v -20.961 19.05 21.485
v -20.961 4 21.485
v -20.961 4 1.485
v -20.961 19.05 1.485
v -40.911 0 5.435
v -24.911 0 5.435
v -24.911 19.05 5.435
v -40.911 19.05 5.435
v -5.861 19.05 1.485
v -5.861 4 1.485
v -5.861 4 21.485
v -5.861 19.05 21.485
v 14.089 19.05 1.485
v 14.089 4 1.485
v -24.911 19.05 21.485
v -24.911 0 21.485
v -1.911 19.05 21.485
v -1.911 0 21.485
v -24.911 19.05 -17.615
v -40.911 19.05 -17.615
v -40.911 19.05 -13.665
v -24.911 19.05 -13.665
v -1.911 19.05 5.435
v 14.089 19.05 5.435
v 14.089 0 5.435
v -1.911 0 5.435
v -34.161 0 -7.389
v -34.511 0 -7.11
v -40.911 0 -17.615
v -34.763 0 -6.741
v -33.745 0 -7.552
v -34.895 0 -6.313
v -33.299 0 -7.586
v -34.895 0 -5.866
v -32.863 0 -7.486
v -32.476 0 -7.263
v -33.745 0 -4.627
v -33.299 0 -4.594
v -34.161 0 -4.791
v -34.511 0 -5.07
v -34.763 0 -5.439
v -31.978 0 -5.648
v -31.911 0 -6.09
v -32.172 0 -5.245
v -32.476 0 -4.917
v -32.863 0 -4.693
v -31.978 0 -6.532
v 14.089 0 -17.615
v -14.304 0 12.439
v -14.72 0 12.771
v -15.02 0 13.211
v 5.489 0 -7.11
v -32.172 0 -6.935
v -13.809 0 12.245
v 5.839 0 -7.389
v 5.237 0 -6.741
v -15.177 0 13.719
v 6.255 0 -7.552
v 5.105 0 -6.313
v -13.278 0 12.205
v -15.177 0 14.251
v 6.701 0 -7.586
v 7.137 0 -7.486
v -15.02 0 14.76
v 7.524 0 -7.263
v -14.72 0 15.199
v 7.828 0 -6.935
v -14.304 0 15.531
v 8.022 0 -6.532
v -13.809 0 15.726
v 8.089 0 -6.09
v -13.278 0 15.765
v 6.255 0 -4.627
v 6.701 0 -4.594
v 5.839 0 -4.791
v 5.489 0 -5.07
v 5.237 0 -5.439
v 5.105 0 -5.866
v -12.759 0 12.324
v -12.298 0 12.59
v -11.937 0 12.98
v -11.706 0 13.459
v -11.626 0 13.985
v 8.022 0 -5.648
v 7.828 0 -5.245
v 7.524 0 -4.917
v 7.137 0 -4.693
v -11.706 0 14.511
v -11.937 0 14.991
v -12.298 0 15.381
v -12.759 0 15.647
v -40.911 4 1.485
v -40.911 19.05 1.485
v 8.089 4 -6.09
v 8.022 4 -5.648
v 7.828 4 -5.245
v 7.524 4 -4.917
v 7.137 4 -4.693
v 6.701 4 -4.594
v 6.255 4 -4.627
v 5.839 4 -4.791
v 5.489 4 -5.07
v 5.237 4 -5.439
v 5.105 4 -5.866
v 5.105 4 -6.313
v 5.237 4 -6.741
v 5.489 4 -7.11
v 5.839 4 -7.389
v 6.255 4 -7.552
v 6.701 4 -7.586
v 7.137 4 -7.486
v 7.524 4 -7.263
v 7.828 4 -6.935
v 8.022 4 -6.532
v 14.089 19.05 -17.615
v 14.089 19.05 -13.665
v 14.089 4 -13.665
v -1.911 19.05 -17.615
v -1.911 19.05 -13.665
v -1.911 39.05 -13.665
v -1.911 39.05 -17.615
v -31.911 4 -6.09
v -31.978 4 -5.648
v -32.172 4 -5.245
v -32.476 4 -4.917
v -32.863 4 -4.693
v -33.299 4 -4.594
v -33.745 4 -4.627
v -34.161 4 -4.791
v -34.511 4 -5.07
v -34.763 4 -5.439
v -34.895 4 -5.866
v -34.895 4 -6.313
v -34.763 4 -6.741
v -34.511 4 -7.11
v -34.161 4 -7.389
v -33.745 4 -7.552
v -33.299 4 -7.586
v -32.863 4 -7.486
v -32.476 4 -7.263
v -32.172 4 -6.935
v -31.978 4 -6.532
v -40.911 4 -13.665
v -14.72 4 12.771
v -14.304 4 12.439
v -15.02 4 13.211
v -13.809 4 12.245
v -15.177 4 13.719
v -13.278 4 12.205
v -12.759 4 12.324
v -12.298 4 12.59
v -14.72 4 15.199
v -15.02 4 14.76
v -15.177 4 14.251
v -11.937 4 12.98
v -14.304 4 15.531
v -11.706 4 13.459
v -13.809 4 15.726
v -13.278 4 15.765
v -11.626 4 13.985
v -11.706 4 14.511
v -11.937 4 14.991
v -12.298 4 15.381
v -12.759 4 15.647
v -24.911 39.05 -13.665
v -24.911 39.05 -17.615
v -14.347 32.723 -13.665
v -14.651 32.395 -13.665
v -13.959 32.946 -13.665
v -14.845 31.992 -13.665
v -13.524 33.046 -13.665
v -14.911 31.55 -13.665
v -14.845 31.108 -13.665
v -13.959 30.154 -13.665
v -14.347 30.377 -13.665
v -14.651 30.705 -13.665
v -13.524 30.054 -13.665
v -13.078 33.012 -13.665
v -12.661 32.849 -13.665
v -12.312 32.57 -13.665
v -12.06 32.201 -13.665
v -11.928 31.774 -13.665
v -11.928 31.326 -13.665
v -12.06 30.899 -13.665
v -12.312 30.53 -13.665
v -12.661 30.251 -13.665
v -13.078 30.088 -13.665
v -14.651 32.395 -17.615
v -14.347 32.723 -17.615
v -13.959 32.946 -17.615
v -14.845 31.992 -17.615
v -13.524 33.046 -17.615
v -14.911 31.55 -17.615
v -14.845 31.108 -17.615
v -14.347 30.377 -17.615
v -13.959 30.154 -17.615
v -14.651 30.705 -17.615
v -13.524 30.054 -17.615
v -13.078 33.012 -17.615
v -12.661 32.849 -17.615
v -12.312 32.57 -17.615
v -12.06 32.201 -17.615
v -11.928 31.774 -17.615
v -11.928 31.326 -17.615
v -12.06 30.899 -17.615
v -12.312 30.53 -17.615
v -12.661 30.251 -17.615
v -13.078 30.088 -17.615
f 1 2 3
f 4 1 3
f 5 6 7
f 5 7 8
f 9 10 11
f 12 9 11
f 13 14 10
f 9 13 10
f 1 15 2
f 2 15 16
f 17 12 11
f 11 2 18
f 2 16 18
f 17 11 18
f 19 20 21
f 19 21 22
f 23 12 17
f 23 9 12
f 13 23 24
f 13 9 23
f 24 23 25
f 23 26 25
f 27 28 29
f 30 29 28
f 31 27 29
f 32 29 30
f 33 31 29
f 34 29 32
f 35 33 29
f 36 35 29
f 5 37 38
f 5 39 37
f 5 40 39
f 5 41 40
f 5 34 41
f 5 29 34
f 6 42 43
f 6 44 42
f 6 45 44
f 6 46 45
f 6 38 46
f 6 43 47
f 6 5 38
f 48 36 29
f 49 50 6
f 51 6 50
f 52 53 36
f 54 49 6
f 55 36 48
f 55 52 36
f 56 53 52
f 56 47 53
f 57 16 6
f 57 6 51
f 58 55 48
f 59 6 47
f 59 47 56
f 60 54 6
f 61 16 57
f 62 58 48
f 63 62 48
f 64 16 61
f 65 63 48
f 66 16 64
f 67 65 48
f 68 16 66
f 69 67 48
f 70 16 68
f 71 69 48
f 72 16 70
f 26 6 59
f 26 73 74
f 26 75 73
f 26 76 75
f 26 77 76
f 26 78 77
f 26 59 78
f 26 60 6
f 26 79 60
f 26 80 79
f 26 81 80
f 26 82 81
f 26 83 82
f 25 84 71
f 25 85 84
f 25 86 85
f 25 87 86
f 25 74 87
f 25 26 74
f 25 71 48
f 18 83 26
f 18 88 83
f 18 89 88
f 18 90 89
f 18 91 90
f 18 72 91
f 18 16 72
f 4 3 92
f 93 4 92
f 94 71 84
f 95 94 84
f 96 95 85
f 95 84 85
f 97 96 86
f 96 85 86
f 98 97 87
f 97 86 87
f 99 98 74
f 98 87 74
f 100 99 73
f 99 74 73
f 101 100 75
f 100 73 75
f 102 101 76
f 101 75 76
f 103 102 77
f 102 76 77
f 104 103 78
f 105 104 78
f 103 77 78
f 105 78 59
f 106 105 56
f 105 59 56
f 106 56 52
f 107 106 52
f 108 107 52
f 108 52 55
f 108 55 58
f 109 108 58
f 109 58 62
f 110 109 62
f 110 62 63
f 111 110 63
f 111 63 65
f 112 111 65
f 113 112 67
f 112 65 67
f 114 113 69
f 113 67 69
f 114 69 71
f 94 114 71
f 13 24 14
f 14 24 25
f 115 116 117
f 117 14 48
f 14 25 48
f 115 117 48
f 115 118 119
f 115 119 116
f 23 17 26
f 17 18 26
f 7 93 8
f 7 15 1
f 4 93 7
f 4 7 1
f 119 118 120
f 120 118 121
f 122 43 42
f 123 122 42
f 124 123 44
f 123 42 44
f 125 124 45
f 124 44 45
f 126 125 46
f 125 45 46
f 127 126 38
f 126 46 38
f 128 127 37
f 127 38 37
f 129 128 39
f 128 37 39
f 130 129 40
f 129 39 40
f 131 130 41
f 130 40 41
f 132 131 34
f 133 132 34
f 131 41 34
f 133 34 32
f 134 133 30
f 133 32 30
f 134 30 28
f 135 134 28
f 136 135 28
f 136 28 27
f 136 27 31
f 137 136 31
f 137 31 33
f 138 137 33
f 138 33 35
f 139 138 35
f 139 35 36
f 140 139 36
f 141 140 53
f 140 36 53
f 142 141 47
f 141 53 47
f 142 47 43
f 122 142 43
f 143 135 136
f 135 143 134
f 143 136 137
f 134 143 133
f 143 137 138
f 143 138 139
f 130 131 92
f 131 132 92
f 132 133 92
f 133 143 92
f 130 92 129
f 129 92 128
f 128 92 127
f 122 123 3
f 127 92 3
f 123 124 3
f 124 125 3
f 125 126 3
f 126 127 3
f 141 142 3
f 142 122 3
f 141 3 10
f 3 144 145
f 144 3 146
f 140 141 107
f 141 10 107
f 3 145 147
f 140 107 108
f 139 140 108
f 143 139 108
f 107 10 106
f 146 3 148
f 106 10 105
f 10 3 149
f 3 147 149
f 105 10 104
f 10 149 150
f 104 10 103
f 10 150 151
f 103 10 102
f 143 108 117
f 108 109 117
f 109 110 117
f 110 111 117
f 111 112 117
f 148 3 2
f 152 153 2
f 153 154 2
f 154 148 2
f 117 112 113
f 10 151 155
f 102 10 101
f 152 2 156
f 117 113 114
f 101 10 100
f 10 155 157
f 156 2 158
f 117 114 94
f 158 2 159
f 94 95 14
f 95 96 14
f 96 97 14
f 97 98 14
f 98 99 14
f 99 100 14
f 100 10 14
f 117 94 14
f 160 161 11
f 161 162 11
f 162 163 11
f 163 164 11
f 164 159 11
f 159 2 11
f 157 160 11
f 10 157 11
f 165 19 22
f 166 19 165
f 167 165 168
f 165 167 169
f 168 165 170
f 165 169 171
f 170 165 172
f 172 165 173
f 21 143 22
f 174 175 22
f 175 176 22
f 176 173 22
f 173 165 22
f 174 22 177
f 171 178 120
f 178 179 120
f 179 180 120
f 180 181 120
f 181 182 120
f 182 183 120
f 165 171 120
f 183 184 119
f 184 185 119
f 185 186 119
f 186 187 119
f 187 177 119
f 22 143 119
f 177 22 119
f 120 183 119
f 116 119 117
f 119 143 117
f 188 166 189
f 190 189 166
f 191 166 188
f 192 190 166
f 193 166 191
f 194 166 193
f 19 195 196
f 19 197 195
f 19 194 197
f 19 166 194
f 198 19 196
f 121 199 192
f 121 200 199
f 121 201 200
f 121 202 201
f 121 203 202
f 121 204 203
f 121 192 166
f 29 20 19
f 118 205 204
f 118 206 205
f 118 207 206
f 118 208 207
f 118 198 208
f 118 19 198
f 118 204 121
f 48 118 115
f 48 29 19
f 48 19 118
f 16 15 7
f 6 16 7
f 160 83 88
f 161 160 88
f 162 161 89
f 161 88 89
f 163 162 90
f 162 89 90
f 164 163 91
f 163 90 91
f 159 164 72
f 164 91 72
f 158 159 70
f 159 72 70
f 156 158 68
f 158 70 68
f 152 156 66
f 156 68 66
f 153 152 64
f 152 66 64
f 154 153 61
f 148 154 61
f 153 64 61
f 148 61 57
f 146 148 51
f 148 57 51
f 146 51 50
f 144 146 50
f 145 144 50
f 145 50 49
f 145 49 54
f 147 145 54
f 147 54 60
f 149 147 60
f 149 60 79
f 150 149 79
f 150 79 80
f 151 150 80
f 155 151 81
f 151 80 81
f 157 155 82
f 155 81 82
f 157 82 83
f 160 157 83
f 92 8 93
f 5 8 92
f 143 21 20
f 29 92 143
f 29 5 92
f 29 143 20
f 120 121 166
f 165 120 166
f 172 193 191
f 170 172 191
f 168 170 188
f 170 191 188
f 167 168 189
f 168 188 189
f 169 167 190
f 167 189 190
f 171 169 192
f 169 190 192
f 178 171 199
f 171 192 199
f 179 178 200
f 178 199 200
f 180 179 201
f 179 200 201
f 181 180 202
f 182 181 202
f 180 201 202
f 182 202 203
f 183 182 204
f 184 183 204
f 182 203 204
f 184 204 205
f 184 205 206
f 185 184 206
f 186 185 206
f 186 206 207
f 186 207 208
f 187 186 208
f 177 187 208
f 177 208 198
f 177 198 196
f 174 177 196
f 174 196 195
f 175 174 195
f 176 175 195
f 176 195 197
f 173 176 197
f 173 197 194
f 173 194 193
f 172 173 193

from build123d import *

# Parameters (mm, degrees)
SKETCH_1_W          = 55
SKETCH_1_H          = 19.1
EXTRUDE_1_DEPTH     = 4
SKETCH_2_W          = 55
SKETCH_2_H          = 3.95
EXTRUDE_2_DEPTH     = 15.05
EXTRUDE_3_DEPTH     = 4
SKETCH_4_W          = 3.95
SKETCH_4_H          = 16.05
SKETCH_4_W_2        = 16
SKETCH_4_H_2        = 3.95
EXTRUDE_4_DEPTH     = 15.05
SKETCH_5_W          = 23
SKETCH_5_H          = 20
EXTRUDE_5_DEPTH     = 3.95
SKETCH_6_R          = 1.5
CUT_EXTRUDE_1_DEPTH = 4
SKETCH_7_R          = 1.5
SKETCH_7_R_2        = 1.78505628
CUT_EXTRUDE_2_DEPTH = 4


with BuildPart() as part:
    # 草图1 → 凸台-拉伸1 (new body)
    with BuildSketch(Plane(origin=(0, 0, 0), x_dir=(1, 0, 0), z_dir=(0, 1, 0))):
        with Locations((-13.411439114, 8.064760148)):
            Rectangle(SKETCH_1_W, SKETCH_1_H)
    extrude(amount=EXTRUDE_1_DEPTH)

    # 草图2 → 凸台-拉伸2 (add)
    with BuildSketch(Plane(origin=(0, 4, 0), x_dir=(1, 0, 0), z_dir=(0, 1, 0))):
        with Locations((-13.411439114, 15.639760148)):
            Rectangle(SKETCH_2_W, SKETCH_2_H)
    extrude(amount=EXTRUDE_2_DEPTH)



with BuildPart() as body_2:
    # 草图3 → 凸台-拉伸3 (new body)
    with BuildSketch(Plane.XZ):
        Polygon((-40.911439114, 5.435239852), (-40.911439114, 1.485239852), (-28.911439114, 1.485239852), (-5.911439114, 1.485239852), (14.088560886, 1.485239852), (14.088560886, 5.435239852), (-1.911439114, 5.435239852), (-1.911439114, 21.485239852), (-24.911439114, 21.485239852), (-24.911439114, 5.435239852), align=None)
    extrude(amount=-EXTRUDE_3_DEPTH)


with BuildPart() as part_1:
    add(part.part)

    add(body_2.part)  # 凸台-拉伸4 merges body 2
    # 草图4 → 凸台-拉伸4 (add)
    with BuildSketch(Plane(origin=(0, 4, 0), x_dir=(1, 0, 0), z_dir=(0, 1, 0))):
        with Locations((-3.886439114, -13.460239852)):
            Rectangle(SKETCH_4_W, SKETCH_4_H)
        Polygon((-1.911439114, -5.435239852), (14.088560886, -5.435239852), (14.088560886, -1.485239852), (-5.861439114, -1.485239852), (-5.861439114, -5.435239852), align=None)
        Polygon((-20.961439114, -21.485239852), (-20.961439114, -1.485239852), (-24.911439114, -1.485239852), (-24.911439114, -5.435239852), (-24.911439114, -21.485239852), align=None)
        with Locations((-32.911439114, -3.460239852)):
            Rectangle(SKETCH_4_W_2, SKETCH_4_H_2)
    extrude(amount=EXTRUDE_4_DEPTH)

    # 草图5 → 凸台-拉伸5 (add)
    with BuildSketch(Plane(origin=(0, 0, -17.614760148), x_dir=(-1, 0, 0), z_dir=(0, 0, -1))):
        with Locations((13.411439114, 29.05)):
            Rectangle(SKETCH_5_W, SKETCH_5_H)
    extrude(amount=-EXTRUDE_5_DEPTH)

    # 草图6 → 切除-拉伸1 (cut)
    with BuildSketch(Plane(origin=(0, 0, -17.614760148), x_dir=(-1, 0, 0), z_dir=(0, 0, -1))):
        with Locations((13.411439114, 31.55)):
            Circle(SKETCH_6_R)
    extrude(amount=-CUT_EXTRUDE_1_DEPTH, mode=Mode.SUBTRACT)

    # 草图7 → 切除-拉伸2 (cut)
    with BuildSketch(Plane.XZ):
        with Locations((6.588560886, -6.089760148)):
            Circle(SKETCH_7_R)
        with Locations((-33.411439114, -6.089760148)):
            Circle(SKETCH_7_R)
        with Locations((-13.411439114, 13.985239852)):
            Circle(SKETCH_7_R_2)
    extrude(amount=-CUT_EXTRUDE_2_DEPTH, mode=Mode.SUBTRACT)


solid = part_1.part
